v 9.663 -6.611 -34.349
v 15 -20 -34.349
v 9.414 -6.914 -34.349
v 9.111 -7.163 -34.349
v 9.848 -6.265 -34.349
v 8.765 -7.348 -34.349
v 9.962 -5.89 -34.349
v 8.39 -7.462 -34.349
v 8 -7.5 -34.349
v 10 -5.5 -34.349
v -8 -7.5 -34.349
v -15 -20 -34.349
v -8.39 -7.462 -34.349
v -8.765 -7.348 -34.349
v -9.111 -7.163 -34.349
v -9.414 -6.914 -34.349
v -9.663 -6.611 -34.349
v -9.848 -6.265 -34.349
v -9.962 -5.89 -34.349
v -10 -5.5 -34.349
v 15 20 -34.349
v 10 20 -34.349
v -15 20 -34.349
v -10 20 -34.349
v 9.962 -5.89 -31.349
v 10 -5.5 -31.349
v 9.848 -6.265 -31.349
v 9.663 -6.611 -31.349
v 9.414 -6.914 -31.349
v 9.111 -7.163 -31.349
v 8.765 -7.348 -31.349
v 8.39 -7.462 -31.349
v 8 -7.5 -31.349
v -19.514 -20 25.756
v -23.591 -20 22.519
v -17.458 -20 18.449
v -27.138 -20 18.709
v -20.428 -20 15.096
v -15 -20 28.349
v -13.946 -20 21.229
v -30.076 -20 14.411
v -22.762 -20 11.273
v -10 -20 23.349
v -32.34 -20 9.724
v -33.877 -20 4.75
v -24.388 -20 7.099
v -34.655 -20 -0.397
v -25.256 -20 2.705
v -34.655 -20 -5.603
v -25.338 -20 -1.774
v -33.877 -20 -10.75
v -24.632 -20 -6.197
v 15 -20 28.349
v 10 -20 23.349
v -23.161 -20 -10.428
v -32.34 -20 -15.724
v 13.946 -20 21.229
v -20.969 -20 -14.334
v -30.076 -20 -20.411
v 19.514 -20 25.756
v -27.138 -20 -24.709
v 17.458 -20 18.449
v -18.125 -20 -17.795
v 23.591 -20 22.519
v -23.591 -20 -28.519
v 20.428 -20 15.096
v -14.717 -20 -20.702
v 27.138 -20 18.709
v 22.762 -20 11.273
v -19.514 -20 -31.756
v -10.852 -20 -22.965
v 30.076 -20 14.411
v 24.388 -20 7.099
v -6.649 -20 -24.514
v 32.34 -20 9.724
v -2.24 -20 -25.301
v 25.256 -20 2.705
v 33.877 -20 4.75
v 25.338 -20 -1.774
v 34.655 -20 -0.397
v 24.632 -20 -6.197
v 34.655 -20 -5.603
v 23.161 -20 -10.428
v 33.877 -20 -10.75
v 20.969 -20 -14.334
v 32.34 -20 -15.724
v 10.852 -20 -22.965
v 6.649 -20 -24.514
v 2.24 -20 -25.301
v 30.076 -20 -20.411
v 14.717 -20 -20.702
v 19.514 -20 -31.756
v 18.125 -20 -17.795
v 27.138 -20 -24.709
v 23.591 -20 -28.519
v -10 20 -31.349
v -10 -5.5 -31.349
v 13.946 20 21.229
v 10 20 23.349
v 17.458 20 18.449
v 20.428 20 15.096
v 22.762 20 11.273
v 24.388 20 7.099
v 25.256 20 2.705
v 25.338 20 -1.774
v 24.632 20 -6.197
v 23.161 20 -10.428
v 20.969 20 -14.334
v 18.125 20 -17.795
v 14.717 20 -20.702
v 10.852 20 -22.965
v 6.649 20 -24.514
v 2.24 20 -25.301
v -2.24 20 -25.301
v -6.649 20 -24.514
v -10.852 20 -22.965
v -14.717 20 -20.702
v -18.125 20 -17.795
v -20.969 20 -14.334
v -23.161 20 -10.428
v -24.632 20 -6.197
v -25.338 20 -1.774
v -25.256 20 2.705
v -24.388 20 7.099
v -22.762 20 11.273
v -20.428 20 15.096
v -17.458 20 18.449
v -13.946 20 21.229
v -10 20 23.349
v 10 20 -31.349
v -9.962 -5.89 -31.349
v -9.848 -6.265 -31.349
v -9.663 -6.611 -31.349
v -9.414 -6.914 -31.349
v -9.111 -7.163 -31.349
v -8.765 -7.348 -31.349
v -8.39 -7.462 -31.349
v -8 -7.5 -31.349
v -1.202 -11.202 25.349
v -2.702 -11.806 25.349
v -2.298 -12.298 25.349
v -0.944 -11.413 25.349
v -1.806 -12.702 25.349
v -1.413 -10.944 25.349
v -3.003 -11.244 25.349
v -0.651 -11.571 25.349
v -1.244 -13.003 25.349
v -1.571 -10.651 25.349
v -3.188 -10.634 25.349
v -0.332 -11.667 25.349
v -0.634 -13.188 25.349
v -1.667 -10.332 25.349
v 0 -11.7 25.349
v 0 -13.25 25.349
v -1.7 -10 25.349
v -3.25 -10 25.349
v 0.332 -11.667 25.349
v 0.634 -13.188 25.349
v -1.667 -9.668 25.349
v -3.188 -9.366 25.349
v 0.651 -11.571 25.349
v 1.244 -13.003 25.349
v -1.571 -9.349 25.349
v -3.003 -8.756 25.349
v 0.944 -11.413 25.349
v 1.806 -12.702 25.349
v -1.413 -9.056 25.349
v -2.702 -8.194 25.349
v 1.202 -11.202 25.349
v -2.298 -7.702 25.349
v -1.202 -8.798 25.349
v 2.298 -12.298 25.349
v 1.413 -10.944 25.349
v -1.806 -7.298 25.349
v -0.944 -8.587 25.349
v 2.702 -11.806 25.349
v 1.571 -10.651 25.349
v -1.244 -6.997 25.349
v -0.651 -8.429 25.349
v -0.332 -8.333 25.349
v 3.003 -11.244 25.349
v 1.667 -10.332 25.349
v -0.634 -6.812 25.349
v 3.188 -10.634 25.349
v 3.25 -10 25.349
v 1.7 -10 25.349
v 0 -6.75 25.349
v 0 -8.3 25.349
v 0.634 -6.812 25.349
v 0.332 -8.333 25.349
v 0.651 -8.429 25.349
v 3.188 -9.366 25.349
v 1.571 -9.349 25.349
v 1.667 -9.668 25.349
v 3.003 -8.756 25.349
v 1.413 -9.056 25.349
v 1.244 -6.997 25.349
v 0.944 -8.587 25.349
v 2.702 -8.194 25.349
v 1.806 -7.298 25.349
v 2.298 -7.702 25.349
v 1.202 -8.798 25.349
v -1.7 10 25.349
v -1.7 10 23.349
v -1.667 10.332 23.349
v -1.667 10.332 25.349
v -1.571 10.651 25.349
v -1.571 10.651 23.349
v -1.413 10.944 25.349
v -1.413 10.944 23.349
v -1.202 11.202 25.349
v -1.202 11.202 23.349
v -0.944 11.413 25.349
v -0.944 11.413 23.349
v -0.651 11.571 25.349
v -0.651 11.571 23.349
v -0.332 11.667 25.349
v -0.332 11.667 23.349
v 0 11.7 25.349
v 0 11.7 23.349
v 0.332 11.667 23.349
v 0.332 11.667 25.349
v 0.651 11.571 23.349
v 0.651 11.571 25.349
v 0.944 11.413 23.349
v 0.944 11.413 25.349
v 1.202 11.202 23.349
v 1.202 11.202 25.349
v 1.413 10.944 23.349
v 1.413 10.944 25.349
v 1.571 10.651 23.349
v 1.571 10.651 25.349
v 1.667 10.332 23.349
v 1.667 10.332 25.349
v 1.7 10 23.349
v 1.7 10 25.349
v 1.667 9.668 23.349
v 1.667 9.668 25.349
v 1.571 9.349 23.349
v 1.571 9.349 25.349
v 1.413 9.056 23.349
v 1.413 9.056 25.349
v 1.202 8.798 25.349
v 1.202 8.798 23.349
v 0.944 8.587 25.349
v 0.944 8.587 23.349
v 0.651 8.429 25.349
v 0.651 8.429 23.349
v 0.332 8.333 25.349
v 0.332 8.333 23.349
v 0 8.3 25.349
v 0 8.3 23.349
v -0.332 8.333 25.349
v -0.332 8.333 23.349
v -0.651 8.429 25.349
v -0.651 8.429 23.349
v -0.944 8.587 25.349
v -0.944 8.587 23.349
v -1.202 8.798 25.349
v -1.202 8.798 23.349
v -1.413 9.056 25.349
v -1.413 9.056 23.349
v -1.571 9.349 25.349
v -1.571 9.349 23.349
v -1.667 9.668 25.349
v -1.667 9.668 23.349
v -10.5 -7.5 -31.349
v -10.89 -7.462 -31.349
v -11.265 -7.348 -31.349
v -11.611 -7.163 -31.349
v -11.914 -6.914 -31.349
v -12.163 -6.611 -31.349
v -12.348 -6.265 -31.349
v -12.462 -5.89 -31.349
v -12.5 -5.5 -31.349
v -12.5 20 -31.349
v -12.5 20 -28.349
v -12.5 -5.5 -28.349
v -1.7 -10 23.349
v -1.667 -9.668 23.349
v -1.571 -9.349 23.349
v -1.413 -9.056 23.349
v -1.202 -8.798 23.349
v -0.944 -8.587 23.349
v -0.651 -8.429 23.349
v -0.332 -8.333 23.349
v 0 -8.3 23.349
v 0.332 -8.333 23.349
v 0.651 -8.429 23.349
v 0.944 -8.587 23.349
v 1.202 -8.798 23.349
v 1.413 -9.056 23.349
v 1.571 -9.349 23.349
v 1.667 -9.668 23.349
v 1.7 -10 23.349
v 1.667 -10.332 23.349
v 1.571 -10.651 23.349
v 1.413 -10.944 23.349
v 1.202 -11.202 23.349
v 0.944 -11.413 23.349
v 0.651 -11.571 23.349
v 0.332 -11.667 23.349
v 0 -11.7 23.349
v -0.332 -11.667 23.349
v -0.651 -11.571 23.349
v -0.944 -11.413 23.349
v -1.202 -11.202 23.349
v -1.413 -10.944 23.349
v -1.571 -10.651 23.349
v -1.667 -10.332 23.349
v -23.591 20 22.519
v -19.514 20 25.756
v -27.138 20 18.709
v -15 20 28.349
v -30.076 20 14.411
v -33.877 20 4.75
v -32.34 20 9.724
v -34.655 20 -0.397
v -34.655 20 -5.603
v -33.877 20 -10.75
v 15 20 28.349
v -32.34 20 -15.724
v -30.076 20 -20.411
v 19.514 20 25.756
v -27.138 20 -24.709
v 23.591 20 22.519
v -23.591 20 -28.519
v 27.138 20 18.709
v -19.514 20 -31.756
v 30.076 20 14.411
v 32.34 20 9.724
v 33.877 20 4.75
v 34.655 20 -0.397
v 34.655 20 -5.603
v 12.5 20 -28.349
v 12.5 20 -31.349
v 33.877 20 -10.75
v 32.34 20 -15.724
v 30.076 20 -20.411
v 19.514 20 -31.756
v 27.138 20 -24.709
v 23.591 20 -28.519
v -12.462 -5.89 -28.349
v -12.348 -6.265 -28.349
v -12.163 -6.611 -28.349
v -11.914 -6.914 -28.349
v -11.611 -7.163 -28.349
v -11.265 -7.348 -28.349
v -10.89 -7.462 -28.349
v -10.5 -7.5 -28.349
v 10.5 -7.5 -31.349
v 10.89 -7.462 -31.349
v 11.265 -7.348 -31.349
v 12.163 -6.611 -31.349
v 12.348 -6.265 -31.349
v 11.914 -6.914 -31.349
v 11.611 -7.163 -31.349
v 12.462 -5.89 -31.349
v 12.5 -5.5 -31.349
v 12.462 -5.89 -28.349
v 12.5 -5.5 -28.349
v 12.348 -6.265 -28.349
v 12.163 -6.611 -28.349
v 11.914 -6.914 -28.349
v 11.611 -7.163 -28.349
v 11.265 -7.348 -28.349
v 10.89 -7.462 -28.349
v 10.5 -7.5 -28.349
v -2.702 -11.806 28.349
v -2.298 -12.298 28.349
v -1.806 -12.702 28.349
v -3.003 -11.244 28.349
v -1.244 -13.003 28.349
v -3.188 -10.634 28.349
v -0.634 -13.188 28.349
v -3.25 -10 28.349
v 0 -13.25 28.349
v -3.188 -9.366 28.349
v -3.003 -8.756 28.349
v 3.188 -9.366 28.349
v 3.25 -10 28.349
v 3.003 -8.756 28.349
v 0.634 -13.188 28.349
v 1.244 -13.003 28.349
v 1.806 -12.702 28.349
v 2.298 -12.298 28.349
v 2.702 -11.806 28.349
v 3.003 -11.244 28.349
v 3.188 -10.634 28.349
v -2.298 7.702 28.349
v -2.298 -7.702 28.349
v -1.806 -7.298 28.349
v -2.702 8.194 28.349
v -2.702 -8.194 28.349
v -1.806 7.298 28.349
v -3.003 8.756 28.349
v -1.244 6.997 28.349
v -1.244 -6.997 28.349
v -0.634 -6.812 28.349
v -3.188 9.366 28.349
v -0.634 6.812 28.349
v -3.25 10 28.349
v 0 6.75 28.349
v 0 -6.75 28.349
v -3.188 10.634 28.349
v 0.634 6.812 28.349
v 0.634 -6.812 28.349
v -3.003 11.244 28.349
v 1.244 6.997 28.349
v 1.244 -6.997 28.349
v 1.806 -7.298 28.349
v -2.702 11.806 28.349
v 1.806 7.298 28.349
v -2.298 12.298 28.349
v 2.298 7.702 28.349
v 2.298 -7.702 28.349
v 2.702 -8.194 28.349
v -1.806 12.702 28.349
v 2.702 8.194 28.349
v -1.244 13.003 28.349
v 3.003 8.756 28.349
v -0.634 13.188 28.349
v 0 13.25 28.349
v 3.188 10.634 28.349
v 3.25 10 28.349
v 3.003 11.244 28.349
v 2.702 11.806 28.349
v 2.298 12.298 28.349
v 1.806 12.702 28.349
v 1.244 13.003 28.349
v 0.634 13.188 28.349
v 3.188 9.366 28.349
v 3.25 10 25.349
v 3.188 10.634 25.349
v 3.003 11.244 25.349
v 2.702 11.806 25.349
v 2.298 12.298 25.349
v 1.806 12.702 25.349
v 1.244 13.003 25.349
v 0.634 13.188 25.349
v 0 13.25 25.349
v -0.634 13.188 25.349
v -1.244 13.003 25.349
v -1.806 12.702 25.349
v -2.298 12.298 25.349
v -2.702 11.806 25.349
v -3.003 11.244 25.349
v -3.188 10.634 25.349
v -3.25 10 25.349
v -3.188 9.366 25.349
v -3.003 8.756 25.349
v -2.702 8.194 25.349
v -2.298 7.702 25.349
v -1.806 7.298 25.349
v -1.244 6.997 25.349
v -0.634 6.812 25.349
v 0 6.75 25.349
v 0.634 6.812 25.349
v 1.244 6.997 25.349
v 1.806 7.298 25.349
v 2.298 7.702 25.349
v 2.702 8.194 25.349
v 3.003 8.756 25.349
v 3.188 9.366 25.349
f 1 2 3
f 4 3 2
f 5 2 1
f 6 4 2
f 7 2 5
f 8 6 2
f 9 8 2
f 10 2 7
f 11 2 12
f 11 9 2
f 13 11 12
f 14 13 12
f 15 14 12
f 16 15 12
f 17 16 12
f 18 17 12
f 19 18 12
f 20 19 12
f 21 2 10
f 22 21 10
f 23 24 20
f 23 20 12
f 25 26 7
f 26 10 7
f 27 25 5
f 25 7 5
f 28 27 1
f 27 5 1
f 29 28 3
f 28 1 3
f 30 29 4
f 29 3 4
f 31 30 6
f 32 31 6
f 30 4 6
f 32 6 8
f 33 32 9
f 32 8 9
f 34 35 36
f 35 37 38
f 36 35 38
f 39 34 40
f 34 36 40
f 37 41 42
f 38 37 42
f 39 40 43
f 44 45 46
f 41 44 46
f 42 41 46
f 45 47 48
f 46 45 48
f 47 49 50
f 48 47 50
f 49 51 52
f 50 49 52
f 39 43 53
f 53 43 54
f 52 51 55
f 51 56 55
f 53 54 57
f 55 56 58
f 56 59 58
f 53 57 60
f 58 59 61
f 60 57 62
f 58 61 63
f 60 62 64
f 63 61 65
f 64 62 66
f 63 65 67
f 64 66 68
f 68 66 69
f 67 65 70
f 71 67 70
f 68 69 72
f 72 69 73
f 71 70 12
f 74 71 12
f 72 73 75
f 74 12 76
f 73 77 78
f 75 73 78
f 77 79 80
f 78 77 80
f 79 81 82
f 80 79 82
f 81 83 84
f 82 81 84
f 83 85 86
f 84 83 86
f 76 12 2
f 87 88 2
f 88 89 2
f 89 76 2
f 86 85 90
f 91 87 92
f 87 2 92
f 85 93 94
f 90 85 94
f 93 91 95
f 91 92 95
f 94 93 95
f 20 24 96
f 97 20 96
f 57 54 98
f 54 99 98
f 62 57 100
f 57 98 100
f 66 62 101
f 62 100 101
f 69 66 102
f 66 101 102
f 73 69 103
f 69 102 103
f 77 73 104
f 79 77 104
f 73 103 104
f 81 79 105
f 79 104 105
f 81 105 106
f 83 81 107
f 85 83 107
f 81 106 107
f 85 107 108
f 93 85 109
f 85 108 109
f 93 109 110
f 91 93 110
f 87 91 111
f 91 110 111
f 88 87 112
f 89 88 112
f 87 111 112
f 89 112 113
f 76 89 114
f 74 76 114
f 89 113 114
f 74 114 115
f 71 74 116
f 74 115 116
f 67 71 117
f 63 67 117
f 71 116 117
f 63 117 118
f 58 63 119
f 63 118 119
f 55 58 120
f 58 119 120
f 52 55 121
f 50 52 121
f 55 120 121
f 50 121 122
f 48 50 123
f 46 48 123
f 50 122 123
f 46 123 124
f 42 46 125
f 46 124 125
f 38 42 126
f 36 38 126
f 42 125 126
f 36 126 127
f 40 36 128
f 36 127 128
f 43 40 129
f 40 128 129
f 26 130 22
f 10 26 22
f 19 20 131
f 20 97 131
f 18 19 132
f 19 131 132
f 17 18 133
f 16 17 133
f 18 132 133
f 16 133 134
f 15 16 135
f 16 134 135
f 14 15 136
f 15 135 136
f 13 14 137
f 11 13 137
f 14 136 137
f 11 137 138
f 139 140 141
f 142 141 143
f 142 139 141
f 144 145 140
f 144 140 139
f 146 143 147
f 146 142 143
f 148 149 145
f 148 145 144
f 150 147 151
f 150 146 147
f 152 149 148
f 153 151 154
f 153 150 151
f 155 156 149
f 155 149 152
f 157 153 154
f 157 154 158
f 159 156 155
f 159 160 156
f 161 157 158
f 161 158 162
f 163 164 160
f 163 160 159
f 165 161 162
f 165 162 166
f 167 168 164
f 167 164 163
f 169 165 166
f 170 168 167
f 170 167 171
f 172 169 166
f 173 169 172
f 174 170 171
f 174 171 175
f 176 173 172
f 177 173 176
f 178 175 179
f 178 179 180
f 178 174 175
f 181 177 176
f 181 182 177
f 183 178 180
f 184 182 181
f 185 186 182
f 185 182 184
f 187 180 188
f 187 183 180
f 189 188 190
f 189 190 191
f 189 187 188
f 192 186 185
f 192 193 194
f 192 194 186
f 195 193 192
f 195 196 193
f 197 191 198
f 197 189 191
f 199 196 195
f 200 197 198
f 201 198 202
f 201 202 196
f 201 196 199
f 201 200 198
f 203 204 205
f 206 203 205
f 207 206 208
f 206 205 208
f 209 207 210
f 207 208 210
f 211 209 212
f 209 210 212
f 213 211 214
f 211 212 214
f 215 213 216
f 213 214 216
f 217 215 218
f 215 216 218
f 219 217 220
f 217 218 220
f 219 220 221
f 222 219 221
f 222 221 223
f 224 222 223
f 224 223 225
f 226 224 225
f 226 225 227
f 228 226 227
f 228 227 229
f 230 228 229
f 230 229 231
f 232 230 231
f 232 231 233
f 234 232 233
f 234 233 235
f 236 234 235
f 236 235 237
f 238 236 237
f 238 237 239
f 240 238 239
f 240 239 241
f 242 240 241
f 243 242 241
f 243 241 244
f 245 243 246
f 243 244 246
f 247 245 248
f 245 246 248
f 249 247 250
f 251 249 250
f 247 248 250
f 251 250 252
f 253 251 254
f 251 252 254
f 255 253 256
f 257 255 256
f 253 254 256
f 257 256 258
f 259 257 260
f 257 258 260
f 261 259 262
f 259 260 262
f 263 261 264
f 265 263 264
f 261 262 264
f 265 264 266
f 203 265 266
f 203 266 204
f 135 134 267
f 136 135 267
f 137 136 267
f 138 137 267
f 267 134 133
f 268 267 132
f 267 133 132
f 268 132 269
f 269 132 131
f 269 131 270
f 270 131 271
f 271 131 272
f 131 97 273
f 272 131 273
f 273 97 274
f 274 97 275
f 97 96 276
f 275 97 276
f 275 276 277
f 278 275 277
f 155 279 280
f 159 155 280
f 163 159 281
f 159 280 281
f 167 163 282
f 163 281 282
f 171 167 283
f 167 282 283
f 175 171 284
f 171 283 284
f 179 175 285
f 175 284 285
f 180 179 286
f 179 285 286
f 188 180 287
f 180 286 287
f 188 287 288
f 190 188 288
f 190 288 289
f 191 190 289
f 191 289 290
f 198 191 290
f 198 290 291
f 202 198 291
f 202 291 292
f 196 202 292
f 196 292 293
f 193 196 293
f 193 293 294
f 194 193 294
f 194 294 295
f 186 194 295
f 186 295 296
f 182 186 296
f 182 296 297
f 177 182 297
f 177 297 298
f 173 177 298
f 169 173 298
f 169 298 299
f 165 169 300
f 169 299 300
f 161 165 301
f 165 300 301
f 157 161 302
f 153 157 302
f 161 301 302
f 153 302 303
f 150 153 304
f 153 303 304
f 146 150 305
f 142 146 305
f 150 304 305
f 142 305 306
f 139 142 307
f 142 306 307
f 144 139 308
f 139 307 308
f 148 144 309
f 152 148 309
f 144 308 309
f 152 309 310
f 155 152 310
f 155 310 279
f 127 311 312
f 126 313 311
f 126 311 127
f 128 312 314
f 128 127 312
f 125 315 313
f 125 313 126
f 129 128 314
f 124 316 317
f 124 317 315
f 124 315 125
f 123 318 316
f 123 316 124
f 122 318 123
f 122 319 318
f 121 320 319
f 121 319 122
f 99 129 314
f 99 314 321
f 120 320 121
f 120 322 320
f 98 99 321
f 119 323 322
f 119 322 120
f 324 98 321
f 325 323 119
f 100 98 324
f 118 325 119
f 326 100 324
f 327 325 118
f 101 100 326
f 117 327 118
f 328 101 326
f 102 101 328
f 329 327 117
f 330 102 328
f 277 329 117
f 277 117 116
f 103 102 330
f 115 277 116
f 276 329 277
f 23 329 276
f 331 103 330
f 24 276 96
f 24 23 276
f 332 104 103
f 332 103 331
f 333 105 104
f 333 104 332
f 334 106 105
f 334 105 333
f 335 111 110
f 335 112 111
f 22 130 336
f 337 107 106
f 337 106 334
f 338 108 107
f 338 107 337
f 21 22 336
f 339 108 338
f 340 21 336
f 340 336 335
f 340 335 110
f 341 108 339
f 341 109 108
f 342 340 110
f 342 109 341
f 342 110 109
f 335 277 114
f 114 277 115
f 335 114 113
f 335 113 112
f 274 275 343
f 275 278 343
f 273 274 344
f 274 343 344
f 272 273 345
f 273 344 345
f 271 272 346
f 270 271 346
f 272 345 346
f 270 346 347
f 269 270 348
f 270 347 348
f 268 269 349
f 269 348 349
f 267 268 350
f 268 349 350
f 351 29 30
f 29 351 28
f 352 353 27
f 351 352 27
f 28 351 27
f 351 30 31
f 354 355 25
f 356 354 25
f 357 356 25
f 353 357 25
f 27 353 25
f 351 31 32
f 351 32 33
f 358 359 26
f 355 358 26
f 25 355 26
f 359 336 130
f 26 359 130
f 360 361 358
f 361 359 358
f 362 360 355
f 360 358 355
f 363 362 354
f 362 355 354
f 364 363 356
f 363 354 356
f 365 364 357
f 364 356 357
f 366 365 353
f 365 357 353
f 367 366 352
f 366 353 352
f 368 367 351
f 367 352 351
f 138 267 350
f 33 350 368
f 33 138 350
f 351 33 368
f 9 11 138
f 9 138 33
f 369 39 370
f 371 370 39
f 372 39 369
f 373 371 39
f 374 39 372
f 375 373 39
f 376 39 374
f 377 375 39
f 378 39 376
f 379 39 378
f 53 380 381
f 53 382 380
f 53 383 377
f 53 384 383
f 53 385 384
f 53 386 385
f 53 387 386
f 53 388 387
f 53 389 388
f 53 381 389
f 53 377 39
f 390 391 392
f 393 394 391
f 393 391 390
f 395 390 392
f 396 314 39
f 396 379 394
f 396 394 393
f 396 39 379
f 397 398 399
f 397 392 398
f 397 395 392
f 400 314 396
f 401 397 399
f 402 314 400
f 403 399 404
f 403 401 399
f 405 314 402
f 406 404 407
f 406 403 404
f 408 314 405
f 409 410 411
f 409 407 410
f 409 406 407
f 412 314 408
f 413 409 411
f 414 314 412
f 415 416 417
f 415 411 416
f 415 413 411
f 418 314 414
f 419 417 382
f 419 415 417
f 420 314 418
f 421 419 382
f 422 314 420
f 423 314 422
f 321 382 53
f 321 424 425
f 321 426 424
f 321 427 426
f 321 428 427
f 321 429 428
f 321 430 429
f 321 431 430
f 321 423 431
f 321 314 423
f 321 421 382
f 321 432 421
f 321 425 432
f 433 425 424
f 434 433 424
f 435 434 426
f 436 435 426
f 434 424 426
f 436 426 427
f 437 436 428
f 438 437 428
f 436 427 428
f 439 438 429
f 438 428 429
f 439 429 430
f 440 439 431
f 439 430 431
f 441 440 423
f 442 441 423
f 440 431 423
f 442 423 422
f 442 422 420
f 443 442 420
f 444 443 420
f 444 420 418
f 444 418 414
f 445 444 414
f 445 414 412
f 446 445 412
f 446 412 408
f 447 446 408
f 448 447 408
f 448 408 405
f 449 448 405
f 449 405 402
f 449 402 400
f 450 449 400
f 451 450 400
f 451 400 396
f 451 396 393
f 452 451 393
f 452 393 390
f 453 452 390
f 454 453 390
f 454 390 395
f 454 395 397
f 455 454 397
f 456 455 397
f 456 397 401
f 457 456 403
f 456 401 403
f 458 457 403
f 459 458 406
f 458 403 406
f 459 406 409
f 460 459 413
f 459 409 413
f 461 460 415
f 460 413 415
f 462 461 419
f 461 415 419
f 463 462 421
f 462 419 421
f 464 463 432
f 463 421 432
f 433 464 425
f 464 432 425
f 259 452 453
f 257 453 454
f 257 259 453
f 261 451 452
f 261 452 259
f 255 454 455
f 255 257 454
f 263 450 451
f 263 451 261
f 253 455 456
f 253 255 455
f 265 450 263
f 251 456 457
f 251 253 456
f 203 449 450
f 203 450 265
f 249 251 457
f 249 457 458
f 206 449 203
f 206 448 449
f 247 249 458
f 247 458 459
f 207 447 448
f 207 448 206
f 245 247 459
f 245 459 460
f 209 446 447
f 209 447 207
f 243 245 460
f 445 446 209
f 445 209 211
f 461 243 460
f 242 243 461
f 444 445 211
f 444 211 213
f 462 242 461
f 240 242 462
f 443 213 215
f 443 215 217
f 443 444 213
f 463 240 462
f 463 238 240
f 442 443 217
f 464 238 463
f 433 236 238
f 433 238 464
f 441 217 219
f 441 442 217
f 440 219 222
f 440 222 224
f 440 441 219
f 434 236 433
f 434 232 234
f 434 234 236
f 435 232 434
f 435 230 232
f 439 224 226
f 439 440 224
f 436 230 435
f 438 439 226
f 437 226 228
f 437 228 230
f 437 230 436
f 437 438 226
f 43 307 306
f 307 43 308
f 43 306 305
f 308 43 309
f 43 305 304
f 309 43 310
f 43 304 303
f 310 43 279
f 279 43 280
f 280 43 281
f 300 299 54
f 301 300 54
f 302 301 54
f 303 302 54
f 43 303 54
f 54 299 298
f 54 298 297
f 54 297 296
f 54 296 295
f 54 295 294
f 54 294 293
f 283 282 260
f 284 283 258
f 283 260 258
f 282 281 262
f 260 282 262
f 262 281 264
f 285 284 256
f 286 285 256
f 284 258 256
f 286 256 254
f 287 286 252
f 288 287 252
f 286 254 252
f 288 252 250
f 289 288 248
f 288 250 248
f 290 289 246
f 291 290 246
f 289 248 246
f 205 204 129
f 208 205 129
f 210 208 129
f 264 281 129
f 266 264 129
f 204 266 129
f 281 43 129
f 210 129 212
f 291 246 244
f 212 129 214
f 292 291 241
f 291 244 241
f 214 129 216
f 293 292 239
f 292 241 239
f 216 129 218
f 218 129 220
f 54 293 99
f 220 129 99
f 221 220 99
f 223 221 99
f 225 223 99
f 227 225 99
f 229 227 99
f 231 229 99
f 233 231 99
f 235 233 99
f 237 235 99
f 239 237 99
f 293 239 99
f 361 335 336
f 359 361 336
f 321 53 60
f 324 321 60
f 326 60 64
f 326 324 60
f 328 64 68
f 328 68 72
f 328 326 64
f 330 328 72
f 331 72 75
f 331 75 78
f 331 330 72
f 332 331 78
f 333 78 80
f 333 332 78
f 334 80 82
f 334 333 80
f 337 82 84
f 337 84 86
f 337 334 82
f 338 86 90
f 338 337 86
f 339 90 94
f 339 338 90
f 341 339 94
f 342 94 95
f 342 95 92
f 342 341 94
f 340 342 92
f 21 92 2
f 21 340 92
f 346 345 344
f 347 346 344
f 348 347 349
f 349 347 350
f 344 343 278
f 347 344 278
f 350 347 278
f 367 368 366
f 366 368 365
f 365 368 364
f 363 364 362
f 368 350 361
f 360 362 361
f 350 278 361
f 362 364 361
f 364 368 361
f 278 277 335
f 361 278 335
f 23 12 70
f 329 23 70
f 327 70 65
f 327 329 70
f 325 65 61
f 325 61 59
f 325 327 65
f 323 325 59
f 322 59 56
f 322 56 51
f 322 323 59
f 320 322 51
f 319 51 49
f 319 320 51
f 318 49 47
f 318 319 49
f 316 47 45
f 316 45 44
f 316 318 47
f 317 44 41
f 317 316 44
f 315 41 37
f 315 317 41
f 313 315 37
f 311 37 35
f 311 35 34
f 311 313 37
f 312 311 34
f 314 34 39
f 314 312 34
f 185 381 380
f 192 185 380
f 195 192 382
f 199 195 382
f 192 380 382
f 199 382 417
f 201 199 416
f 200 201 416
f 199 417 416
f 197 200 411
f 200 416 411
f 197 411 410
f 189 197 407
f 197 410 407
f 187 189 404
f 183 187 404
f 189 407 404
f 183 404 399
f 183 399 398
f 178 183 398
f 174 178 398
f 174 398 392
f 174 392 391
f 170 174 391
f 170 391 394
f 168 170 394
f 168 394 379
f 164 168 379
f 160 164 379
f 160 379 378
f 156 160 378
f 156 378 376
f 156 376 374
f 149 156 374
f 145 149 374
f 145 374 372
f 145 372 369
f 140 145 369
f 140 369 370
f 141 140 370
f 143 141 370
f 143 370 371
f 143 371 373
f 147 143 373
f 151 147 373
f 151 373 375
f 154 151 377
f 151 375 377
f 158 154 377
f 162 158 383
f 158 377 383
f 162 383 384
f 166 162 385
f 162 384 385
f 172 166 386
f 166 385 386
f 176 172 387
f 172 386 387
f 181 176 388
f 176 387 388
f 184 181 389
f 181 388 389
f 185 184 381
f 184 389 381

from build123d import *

# Parameters (mm, degrees)
BOSS_EXTRUDE1_DEPTH            = 20
CUT_EXTRUDE1_DEPTH             = 27.5
CBORE_FOR_M3_SHCS1_D           = 3.4
CBORE_FOR_M3_SHCS1_DEPTH       = 5
CBORE_FOR_M3_SHCS1_CBORE_D     = 6.5
CBORE_FOR_M3_SHCS1_CBORE_DEPTH = 3
FILLET1_R                      = 2


with BuildPart() as part:
    # Sketch1 → Boss-Extrude1 (new body, symmetric)
    with BuildSketch(Plane(origin=(0, 0, 0), x_dir=(1, 0, 0), z_dir=(0, 1, 0))):
        with BuildLine():
            Line((-15, -28.348661632), (15, -28.348661632))
            ThreePointArc((15, -28.348661632), (34.752533521, 3), (15, 34.348661632))
            Line((15, 34.348661632), (-15, 34.348661632))
            ThreePointArc((-15, 34.348661632), (-34.752533521, 3), (-15, -28.348661632))
        make_face()
        with BuildLine():
            Line((-10, -23.348661632), (10, -23.348661632))
            ThreePointArc((10, -23.348661632), (0, 25.4), (-10, -23.348661632))
        make_face(mode=Mode.SUBTRACT)
    extrude(amount=BOSS_EXTRUDE1_DEPTH, both=True)

    # Sketch3 → Cut-Extrude1 (cut)
    with BuildSketch(Plane(origin=(0, 20, 0), x_dir=(1, 0, 0), z_dir=(0, 1, 0))):
        Polygon((-10, 34.348661632), (-10, 31.348661632), (-12.5, 31.348661632), (-12.5, 28.348661632), (12.5, 28.348661632), (12.5, 31.348661632), (10, 31.348661632), (10, 34.348661632), align=None)
    extrude(amount=-CUT_EXTRUDE1_DEPTH, mode=Mode.SUBTRACT)

    # CBORE for M3 SHCS1
    with Locations(Plane.XY.offset(28.348661632)):
        with Locations((0, 10), (0, -10)):
            CounterBoreHole(CBORE_FOR_M3_SHCS1_D / 2, CBORE_FOR_M3_SHCS1_CBORE_D / 2, CBORE_FOR_M3_SHCS1_CBORE_DEPTH, depth=CBORE_FOR_M3_SHCS1_DEPTH)

    # Fillet1
    fillet1_edges = [part.edges().sort_by_distance(p)[0] for p in [
        (10, -7.5, -32.848661632),
        (12.5, -7.5, -29.848661632),
        (-12.5, -7.5, -29.848661632),
        (-10, -7.5, -32.848661632),
    ]]
    fillet(fillet1_edges, radius=FILLET1_R)


solid = part.part
